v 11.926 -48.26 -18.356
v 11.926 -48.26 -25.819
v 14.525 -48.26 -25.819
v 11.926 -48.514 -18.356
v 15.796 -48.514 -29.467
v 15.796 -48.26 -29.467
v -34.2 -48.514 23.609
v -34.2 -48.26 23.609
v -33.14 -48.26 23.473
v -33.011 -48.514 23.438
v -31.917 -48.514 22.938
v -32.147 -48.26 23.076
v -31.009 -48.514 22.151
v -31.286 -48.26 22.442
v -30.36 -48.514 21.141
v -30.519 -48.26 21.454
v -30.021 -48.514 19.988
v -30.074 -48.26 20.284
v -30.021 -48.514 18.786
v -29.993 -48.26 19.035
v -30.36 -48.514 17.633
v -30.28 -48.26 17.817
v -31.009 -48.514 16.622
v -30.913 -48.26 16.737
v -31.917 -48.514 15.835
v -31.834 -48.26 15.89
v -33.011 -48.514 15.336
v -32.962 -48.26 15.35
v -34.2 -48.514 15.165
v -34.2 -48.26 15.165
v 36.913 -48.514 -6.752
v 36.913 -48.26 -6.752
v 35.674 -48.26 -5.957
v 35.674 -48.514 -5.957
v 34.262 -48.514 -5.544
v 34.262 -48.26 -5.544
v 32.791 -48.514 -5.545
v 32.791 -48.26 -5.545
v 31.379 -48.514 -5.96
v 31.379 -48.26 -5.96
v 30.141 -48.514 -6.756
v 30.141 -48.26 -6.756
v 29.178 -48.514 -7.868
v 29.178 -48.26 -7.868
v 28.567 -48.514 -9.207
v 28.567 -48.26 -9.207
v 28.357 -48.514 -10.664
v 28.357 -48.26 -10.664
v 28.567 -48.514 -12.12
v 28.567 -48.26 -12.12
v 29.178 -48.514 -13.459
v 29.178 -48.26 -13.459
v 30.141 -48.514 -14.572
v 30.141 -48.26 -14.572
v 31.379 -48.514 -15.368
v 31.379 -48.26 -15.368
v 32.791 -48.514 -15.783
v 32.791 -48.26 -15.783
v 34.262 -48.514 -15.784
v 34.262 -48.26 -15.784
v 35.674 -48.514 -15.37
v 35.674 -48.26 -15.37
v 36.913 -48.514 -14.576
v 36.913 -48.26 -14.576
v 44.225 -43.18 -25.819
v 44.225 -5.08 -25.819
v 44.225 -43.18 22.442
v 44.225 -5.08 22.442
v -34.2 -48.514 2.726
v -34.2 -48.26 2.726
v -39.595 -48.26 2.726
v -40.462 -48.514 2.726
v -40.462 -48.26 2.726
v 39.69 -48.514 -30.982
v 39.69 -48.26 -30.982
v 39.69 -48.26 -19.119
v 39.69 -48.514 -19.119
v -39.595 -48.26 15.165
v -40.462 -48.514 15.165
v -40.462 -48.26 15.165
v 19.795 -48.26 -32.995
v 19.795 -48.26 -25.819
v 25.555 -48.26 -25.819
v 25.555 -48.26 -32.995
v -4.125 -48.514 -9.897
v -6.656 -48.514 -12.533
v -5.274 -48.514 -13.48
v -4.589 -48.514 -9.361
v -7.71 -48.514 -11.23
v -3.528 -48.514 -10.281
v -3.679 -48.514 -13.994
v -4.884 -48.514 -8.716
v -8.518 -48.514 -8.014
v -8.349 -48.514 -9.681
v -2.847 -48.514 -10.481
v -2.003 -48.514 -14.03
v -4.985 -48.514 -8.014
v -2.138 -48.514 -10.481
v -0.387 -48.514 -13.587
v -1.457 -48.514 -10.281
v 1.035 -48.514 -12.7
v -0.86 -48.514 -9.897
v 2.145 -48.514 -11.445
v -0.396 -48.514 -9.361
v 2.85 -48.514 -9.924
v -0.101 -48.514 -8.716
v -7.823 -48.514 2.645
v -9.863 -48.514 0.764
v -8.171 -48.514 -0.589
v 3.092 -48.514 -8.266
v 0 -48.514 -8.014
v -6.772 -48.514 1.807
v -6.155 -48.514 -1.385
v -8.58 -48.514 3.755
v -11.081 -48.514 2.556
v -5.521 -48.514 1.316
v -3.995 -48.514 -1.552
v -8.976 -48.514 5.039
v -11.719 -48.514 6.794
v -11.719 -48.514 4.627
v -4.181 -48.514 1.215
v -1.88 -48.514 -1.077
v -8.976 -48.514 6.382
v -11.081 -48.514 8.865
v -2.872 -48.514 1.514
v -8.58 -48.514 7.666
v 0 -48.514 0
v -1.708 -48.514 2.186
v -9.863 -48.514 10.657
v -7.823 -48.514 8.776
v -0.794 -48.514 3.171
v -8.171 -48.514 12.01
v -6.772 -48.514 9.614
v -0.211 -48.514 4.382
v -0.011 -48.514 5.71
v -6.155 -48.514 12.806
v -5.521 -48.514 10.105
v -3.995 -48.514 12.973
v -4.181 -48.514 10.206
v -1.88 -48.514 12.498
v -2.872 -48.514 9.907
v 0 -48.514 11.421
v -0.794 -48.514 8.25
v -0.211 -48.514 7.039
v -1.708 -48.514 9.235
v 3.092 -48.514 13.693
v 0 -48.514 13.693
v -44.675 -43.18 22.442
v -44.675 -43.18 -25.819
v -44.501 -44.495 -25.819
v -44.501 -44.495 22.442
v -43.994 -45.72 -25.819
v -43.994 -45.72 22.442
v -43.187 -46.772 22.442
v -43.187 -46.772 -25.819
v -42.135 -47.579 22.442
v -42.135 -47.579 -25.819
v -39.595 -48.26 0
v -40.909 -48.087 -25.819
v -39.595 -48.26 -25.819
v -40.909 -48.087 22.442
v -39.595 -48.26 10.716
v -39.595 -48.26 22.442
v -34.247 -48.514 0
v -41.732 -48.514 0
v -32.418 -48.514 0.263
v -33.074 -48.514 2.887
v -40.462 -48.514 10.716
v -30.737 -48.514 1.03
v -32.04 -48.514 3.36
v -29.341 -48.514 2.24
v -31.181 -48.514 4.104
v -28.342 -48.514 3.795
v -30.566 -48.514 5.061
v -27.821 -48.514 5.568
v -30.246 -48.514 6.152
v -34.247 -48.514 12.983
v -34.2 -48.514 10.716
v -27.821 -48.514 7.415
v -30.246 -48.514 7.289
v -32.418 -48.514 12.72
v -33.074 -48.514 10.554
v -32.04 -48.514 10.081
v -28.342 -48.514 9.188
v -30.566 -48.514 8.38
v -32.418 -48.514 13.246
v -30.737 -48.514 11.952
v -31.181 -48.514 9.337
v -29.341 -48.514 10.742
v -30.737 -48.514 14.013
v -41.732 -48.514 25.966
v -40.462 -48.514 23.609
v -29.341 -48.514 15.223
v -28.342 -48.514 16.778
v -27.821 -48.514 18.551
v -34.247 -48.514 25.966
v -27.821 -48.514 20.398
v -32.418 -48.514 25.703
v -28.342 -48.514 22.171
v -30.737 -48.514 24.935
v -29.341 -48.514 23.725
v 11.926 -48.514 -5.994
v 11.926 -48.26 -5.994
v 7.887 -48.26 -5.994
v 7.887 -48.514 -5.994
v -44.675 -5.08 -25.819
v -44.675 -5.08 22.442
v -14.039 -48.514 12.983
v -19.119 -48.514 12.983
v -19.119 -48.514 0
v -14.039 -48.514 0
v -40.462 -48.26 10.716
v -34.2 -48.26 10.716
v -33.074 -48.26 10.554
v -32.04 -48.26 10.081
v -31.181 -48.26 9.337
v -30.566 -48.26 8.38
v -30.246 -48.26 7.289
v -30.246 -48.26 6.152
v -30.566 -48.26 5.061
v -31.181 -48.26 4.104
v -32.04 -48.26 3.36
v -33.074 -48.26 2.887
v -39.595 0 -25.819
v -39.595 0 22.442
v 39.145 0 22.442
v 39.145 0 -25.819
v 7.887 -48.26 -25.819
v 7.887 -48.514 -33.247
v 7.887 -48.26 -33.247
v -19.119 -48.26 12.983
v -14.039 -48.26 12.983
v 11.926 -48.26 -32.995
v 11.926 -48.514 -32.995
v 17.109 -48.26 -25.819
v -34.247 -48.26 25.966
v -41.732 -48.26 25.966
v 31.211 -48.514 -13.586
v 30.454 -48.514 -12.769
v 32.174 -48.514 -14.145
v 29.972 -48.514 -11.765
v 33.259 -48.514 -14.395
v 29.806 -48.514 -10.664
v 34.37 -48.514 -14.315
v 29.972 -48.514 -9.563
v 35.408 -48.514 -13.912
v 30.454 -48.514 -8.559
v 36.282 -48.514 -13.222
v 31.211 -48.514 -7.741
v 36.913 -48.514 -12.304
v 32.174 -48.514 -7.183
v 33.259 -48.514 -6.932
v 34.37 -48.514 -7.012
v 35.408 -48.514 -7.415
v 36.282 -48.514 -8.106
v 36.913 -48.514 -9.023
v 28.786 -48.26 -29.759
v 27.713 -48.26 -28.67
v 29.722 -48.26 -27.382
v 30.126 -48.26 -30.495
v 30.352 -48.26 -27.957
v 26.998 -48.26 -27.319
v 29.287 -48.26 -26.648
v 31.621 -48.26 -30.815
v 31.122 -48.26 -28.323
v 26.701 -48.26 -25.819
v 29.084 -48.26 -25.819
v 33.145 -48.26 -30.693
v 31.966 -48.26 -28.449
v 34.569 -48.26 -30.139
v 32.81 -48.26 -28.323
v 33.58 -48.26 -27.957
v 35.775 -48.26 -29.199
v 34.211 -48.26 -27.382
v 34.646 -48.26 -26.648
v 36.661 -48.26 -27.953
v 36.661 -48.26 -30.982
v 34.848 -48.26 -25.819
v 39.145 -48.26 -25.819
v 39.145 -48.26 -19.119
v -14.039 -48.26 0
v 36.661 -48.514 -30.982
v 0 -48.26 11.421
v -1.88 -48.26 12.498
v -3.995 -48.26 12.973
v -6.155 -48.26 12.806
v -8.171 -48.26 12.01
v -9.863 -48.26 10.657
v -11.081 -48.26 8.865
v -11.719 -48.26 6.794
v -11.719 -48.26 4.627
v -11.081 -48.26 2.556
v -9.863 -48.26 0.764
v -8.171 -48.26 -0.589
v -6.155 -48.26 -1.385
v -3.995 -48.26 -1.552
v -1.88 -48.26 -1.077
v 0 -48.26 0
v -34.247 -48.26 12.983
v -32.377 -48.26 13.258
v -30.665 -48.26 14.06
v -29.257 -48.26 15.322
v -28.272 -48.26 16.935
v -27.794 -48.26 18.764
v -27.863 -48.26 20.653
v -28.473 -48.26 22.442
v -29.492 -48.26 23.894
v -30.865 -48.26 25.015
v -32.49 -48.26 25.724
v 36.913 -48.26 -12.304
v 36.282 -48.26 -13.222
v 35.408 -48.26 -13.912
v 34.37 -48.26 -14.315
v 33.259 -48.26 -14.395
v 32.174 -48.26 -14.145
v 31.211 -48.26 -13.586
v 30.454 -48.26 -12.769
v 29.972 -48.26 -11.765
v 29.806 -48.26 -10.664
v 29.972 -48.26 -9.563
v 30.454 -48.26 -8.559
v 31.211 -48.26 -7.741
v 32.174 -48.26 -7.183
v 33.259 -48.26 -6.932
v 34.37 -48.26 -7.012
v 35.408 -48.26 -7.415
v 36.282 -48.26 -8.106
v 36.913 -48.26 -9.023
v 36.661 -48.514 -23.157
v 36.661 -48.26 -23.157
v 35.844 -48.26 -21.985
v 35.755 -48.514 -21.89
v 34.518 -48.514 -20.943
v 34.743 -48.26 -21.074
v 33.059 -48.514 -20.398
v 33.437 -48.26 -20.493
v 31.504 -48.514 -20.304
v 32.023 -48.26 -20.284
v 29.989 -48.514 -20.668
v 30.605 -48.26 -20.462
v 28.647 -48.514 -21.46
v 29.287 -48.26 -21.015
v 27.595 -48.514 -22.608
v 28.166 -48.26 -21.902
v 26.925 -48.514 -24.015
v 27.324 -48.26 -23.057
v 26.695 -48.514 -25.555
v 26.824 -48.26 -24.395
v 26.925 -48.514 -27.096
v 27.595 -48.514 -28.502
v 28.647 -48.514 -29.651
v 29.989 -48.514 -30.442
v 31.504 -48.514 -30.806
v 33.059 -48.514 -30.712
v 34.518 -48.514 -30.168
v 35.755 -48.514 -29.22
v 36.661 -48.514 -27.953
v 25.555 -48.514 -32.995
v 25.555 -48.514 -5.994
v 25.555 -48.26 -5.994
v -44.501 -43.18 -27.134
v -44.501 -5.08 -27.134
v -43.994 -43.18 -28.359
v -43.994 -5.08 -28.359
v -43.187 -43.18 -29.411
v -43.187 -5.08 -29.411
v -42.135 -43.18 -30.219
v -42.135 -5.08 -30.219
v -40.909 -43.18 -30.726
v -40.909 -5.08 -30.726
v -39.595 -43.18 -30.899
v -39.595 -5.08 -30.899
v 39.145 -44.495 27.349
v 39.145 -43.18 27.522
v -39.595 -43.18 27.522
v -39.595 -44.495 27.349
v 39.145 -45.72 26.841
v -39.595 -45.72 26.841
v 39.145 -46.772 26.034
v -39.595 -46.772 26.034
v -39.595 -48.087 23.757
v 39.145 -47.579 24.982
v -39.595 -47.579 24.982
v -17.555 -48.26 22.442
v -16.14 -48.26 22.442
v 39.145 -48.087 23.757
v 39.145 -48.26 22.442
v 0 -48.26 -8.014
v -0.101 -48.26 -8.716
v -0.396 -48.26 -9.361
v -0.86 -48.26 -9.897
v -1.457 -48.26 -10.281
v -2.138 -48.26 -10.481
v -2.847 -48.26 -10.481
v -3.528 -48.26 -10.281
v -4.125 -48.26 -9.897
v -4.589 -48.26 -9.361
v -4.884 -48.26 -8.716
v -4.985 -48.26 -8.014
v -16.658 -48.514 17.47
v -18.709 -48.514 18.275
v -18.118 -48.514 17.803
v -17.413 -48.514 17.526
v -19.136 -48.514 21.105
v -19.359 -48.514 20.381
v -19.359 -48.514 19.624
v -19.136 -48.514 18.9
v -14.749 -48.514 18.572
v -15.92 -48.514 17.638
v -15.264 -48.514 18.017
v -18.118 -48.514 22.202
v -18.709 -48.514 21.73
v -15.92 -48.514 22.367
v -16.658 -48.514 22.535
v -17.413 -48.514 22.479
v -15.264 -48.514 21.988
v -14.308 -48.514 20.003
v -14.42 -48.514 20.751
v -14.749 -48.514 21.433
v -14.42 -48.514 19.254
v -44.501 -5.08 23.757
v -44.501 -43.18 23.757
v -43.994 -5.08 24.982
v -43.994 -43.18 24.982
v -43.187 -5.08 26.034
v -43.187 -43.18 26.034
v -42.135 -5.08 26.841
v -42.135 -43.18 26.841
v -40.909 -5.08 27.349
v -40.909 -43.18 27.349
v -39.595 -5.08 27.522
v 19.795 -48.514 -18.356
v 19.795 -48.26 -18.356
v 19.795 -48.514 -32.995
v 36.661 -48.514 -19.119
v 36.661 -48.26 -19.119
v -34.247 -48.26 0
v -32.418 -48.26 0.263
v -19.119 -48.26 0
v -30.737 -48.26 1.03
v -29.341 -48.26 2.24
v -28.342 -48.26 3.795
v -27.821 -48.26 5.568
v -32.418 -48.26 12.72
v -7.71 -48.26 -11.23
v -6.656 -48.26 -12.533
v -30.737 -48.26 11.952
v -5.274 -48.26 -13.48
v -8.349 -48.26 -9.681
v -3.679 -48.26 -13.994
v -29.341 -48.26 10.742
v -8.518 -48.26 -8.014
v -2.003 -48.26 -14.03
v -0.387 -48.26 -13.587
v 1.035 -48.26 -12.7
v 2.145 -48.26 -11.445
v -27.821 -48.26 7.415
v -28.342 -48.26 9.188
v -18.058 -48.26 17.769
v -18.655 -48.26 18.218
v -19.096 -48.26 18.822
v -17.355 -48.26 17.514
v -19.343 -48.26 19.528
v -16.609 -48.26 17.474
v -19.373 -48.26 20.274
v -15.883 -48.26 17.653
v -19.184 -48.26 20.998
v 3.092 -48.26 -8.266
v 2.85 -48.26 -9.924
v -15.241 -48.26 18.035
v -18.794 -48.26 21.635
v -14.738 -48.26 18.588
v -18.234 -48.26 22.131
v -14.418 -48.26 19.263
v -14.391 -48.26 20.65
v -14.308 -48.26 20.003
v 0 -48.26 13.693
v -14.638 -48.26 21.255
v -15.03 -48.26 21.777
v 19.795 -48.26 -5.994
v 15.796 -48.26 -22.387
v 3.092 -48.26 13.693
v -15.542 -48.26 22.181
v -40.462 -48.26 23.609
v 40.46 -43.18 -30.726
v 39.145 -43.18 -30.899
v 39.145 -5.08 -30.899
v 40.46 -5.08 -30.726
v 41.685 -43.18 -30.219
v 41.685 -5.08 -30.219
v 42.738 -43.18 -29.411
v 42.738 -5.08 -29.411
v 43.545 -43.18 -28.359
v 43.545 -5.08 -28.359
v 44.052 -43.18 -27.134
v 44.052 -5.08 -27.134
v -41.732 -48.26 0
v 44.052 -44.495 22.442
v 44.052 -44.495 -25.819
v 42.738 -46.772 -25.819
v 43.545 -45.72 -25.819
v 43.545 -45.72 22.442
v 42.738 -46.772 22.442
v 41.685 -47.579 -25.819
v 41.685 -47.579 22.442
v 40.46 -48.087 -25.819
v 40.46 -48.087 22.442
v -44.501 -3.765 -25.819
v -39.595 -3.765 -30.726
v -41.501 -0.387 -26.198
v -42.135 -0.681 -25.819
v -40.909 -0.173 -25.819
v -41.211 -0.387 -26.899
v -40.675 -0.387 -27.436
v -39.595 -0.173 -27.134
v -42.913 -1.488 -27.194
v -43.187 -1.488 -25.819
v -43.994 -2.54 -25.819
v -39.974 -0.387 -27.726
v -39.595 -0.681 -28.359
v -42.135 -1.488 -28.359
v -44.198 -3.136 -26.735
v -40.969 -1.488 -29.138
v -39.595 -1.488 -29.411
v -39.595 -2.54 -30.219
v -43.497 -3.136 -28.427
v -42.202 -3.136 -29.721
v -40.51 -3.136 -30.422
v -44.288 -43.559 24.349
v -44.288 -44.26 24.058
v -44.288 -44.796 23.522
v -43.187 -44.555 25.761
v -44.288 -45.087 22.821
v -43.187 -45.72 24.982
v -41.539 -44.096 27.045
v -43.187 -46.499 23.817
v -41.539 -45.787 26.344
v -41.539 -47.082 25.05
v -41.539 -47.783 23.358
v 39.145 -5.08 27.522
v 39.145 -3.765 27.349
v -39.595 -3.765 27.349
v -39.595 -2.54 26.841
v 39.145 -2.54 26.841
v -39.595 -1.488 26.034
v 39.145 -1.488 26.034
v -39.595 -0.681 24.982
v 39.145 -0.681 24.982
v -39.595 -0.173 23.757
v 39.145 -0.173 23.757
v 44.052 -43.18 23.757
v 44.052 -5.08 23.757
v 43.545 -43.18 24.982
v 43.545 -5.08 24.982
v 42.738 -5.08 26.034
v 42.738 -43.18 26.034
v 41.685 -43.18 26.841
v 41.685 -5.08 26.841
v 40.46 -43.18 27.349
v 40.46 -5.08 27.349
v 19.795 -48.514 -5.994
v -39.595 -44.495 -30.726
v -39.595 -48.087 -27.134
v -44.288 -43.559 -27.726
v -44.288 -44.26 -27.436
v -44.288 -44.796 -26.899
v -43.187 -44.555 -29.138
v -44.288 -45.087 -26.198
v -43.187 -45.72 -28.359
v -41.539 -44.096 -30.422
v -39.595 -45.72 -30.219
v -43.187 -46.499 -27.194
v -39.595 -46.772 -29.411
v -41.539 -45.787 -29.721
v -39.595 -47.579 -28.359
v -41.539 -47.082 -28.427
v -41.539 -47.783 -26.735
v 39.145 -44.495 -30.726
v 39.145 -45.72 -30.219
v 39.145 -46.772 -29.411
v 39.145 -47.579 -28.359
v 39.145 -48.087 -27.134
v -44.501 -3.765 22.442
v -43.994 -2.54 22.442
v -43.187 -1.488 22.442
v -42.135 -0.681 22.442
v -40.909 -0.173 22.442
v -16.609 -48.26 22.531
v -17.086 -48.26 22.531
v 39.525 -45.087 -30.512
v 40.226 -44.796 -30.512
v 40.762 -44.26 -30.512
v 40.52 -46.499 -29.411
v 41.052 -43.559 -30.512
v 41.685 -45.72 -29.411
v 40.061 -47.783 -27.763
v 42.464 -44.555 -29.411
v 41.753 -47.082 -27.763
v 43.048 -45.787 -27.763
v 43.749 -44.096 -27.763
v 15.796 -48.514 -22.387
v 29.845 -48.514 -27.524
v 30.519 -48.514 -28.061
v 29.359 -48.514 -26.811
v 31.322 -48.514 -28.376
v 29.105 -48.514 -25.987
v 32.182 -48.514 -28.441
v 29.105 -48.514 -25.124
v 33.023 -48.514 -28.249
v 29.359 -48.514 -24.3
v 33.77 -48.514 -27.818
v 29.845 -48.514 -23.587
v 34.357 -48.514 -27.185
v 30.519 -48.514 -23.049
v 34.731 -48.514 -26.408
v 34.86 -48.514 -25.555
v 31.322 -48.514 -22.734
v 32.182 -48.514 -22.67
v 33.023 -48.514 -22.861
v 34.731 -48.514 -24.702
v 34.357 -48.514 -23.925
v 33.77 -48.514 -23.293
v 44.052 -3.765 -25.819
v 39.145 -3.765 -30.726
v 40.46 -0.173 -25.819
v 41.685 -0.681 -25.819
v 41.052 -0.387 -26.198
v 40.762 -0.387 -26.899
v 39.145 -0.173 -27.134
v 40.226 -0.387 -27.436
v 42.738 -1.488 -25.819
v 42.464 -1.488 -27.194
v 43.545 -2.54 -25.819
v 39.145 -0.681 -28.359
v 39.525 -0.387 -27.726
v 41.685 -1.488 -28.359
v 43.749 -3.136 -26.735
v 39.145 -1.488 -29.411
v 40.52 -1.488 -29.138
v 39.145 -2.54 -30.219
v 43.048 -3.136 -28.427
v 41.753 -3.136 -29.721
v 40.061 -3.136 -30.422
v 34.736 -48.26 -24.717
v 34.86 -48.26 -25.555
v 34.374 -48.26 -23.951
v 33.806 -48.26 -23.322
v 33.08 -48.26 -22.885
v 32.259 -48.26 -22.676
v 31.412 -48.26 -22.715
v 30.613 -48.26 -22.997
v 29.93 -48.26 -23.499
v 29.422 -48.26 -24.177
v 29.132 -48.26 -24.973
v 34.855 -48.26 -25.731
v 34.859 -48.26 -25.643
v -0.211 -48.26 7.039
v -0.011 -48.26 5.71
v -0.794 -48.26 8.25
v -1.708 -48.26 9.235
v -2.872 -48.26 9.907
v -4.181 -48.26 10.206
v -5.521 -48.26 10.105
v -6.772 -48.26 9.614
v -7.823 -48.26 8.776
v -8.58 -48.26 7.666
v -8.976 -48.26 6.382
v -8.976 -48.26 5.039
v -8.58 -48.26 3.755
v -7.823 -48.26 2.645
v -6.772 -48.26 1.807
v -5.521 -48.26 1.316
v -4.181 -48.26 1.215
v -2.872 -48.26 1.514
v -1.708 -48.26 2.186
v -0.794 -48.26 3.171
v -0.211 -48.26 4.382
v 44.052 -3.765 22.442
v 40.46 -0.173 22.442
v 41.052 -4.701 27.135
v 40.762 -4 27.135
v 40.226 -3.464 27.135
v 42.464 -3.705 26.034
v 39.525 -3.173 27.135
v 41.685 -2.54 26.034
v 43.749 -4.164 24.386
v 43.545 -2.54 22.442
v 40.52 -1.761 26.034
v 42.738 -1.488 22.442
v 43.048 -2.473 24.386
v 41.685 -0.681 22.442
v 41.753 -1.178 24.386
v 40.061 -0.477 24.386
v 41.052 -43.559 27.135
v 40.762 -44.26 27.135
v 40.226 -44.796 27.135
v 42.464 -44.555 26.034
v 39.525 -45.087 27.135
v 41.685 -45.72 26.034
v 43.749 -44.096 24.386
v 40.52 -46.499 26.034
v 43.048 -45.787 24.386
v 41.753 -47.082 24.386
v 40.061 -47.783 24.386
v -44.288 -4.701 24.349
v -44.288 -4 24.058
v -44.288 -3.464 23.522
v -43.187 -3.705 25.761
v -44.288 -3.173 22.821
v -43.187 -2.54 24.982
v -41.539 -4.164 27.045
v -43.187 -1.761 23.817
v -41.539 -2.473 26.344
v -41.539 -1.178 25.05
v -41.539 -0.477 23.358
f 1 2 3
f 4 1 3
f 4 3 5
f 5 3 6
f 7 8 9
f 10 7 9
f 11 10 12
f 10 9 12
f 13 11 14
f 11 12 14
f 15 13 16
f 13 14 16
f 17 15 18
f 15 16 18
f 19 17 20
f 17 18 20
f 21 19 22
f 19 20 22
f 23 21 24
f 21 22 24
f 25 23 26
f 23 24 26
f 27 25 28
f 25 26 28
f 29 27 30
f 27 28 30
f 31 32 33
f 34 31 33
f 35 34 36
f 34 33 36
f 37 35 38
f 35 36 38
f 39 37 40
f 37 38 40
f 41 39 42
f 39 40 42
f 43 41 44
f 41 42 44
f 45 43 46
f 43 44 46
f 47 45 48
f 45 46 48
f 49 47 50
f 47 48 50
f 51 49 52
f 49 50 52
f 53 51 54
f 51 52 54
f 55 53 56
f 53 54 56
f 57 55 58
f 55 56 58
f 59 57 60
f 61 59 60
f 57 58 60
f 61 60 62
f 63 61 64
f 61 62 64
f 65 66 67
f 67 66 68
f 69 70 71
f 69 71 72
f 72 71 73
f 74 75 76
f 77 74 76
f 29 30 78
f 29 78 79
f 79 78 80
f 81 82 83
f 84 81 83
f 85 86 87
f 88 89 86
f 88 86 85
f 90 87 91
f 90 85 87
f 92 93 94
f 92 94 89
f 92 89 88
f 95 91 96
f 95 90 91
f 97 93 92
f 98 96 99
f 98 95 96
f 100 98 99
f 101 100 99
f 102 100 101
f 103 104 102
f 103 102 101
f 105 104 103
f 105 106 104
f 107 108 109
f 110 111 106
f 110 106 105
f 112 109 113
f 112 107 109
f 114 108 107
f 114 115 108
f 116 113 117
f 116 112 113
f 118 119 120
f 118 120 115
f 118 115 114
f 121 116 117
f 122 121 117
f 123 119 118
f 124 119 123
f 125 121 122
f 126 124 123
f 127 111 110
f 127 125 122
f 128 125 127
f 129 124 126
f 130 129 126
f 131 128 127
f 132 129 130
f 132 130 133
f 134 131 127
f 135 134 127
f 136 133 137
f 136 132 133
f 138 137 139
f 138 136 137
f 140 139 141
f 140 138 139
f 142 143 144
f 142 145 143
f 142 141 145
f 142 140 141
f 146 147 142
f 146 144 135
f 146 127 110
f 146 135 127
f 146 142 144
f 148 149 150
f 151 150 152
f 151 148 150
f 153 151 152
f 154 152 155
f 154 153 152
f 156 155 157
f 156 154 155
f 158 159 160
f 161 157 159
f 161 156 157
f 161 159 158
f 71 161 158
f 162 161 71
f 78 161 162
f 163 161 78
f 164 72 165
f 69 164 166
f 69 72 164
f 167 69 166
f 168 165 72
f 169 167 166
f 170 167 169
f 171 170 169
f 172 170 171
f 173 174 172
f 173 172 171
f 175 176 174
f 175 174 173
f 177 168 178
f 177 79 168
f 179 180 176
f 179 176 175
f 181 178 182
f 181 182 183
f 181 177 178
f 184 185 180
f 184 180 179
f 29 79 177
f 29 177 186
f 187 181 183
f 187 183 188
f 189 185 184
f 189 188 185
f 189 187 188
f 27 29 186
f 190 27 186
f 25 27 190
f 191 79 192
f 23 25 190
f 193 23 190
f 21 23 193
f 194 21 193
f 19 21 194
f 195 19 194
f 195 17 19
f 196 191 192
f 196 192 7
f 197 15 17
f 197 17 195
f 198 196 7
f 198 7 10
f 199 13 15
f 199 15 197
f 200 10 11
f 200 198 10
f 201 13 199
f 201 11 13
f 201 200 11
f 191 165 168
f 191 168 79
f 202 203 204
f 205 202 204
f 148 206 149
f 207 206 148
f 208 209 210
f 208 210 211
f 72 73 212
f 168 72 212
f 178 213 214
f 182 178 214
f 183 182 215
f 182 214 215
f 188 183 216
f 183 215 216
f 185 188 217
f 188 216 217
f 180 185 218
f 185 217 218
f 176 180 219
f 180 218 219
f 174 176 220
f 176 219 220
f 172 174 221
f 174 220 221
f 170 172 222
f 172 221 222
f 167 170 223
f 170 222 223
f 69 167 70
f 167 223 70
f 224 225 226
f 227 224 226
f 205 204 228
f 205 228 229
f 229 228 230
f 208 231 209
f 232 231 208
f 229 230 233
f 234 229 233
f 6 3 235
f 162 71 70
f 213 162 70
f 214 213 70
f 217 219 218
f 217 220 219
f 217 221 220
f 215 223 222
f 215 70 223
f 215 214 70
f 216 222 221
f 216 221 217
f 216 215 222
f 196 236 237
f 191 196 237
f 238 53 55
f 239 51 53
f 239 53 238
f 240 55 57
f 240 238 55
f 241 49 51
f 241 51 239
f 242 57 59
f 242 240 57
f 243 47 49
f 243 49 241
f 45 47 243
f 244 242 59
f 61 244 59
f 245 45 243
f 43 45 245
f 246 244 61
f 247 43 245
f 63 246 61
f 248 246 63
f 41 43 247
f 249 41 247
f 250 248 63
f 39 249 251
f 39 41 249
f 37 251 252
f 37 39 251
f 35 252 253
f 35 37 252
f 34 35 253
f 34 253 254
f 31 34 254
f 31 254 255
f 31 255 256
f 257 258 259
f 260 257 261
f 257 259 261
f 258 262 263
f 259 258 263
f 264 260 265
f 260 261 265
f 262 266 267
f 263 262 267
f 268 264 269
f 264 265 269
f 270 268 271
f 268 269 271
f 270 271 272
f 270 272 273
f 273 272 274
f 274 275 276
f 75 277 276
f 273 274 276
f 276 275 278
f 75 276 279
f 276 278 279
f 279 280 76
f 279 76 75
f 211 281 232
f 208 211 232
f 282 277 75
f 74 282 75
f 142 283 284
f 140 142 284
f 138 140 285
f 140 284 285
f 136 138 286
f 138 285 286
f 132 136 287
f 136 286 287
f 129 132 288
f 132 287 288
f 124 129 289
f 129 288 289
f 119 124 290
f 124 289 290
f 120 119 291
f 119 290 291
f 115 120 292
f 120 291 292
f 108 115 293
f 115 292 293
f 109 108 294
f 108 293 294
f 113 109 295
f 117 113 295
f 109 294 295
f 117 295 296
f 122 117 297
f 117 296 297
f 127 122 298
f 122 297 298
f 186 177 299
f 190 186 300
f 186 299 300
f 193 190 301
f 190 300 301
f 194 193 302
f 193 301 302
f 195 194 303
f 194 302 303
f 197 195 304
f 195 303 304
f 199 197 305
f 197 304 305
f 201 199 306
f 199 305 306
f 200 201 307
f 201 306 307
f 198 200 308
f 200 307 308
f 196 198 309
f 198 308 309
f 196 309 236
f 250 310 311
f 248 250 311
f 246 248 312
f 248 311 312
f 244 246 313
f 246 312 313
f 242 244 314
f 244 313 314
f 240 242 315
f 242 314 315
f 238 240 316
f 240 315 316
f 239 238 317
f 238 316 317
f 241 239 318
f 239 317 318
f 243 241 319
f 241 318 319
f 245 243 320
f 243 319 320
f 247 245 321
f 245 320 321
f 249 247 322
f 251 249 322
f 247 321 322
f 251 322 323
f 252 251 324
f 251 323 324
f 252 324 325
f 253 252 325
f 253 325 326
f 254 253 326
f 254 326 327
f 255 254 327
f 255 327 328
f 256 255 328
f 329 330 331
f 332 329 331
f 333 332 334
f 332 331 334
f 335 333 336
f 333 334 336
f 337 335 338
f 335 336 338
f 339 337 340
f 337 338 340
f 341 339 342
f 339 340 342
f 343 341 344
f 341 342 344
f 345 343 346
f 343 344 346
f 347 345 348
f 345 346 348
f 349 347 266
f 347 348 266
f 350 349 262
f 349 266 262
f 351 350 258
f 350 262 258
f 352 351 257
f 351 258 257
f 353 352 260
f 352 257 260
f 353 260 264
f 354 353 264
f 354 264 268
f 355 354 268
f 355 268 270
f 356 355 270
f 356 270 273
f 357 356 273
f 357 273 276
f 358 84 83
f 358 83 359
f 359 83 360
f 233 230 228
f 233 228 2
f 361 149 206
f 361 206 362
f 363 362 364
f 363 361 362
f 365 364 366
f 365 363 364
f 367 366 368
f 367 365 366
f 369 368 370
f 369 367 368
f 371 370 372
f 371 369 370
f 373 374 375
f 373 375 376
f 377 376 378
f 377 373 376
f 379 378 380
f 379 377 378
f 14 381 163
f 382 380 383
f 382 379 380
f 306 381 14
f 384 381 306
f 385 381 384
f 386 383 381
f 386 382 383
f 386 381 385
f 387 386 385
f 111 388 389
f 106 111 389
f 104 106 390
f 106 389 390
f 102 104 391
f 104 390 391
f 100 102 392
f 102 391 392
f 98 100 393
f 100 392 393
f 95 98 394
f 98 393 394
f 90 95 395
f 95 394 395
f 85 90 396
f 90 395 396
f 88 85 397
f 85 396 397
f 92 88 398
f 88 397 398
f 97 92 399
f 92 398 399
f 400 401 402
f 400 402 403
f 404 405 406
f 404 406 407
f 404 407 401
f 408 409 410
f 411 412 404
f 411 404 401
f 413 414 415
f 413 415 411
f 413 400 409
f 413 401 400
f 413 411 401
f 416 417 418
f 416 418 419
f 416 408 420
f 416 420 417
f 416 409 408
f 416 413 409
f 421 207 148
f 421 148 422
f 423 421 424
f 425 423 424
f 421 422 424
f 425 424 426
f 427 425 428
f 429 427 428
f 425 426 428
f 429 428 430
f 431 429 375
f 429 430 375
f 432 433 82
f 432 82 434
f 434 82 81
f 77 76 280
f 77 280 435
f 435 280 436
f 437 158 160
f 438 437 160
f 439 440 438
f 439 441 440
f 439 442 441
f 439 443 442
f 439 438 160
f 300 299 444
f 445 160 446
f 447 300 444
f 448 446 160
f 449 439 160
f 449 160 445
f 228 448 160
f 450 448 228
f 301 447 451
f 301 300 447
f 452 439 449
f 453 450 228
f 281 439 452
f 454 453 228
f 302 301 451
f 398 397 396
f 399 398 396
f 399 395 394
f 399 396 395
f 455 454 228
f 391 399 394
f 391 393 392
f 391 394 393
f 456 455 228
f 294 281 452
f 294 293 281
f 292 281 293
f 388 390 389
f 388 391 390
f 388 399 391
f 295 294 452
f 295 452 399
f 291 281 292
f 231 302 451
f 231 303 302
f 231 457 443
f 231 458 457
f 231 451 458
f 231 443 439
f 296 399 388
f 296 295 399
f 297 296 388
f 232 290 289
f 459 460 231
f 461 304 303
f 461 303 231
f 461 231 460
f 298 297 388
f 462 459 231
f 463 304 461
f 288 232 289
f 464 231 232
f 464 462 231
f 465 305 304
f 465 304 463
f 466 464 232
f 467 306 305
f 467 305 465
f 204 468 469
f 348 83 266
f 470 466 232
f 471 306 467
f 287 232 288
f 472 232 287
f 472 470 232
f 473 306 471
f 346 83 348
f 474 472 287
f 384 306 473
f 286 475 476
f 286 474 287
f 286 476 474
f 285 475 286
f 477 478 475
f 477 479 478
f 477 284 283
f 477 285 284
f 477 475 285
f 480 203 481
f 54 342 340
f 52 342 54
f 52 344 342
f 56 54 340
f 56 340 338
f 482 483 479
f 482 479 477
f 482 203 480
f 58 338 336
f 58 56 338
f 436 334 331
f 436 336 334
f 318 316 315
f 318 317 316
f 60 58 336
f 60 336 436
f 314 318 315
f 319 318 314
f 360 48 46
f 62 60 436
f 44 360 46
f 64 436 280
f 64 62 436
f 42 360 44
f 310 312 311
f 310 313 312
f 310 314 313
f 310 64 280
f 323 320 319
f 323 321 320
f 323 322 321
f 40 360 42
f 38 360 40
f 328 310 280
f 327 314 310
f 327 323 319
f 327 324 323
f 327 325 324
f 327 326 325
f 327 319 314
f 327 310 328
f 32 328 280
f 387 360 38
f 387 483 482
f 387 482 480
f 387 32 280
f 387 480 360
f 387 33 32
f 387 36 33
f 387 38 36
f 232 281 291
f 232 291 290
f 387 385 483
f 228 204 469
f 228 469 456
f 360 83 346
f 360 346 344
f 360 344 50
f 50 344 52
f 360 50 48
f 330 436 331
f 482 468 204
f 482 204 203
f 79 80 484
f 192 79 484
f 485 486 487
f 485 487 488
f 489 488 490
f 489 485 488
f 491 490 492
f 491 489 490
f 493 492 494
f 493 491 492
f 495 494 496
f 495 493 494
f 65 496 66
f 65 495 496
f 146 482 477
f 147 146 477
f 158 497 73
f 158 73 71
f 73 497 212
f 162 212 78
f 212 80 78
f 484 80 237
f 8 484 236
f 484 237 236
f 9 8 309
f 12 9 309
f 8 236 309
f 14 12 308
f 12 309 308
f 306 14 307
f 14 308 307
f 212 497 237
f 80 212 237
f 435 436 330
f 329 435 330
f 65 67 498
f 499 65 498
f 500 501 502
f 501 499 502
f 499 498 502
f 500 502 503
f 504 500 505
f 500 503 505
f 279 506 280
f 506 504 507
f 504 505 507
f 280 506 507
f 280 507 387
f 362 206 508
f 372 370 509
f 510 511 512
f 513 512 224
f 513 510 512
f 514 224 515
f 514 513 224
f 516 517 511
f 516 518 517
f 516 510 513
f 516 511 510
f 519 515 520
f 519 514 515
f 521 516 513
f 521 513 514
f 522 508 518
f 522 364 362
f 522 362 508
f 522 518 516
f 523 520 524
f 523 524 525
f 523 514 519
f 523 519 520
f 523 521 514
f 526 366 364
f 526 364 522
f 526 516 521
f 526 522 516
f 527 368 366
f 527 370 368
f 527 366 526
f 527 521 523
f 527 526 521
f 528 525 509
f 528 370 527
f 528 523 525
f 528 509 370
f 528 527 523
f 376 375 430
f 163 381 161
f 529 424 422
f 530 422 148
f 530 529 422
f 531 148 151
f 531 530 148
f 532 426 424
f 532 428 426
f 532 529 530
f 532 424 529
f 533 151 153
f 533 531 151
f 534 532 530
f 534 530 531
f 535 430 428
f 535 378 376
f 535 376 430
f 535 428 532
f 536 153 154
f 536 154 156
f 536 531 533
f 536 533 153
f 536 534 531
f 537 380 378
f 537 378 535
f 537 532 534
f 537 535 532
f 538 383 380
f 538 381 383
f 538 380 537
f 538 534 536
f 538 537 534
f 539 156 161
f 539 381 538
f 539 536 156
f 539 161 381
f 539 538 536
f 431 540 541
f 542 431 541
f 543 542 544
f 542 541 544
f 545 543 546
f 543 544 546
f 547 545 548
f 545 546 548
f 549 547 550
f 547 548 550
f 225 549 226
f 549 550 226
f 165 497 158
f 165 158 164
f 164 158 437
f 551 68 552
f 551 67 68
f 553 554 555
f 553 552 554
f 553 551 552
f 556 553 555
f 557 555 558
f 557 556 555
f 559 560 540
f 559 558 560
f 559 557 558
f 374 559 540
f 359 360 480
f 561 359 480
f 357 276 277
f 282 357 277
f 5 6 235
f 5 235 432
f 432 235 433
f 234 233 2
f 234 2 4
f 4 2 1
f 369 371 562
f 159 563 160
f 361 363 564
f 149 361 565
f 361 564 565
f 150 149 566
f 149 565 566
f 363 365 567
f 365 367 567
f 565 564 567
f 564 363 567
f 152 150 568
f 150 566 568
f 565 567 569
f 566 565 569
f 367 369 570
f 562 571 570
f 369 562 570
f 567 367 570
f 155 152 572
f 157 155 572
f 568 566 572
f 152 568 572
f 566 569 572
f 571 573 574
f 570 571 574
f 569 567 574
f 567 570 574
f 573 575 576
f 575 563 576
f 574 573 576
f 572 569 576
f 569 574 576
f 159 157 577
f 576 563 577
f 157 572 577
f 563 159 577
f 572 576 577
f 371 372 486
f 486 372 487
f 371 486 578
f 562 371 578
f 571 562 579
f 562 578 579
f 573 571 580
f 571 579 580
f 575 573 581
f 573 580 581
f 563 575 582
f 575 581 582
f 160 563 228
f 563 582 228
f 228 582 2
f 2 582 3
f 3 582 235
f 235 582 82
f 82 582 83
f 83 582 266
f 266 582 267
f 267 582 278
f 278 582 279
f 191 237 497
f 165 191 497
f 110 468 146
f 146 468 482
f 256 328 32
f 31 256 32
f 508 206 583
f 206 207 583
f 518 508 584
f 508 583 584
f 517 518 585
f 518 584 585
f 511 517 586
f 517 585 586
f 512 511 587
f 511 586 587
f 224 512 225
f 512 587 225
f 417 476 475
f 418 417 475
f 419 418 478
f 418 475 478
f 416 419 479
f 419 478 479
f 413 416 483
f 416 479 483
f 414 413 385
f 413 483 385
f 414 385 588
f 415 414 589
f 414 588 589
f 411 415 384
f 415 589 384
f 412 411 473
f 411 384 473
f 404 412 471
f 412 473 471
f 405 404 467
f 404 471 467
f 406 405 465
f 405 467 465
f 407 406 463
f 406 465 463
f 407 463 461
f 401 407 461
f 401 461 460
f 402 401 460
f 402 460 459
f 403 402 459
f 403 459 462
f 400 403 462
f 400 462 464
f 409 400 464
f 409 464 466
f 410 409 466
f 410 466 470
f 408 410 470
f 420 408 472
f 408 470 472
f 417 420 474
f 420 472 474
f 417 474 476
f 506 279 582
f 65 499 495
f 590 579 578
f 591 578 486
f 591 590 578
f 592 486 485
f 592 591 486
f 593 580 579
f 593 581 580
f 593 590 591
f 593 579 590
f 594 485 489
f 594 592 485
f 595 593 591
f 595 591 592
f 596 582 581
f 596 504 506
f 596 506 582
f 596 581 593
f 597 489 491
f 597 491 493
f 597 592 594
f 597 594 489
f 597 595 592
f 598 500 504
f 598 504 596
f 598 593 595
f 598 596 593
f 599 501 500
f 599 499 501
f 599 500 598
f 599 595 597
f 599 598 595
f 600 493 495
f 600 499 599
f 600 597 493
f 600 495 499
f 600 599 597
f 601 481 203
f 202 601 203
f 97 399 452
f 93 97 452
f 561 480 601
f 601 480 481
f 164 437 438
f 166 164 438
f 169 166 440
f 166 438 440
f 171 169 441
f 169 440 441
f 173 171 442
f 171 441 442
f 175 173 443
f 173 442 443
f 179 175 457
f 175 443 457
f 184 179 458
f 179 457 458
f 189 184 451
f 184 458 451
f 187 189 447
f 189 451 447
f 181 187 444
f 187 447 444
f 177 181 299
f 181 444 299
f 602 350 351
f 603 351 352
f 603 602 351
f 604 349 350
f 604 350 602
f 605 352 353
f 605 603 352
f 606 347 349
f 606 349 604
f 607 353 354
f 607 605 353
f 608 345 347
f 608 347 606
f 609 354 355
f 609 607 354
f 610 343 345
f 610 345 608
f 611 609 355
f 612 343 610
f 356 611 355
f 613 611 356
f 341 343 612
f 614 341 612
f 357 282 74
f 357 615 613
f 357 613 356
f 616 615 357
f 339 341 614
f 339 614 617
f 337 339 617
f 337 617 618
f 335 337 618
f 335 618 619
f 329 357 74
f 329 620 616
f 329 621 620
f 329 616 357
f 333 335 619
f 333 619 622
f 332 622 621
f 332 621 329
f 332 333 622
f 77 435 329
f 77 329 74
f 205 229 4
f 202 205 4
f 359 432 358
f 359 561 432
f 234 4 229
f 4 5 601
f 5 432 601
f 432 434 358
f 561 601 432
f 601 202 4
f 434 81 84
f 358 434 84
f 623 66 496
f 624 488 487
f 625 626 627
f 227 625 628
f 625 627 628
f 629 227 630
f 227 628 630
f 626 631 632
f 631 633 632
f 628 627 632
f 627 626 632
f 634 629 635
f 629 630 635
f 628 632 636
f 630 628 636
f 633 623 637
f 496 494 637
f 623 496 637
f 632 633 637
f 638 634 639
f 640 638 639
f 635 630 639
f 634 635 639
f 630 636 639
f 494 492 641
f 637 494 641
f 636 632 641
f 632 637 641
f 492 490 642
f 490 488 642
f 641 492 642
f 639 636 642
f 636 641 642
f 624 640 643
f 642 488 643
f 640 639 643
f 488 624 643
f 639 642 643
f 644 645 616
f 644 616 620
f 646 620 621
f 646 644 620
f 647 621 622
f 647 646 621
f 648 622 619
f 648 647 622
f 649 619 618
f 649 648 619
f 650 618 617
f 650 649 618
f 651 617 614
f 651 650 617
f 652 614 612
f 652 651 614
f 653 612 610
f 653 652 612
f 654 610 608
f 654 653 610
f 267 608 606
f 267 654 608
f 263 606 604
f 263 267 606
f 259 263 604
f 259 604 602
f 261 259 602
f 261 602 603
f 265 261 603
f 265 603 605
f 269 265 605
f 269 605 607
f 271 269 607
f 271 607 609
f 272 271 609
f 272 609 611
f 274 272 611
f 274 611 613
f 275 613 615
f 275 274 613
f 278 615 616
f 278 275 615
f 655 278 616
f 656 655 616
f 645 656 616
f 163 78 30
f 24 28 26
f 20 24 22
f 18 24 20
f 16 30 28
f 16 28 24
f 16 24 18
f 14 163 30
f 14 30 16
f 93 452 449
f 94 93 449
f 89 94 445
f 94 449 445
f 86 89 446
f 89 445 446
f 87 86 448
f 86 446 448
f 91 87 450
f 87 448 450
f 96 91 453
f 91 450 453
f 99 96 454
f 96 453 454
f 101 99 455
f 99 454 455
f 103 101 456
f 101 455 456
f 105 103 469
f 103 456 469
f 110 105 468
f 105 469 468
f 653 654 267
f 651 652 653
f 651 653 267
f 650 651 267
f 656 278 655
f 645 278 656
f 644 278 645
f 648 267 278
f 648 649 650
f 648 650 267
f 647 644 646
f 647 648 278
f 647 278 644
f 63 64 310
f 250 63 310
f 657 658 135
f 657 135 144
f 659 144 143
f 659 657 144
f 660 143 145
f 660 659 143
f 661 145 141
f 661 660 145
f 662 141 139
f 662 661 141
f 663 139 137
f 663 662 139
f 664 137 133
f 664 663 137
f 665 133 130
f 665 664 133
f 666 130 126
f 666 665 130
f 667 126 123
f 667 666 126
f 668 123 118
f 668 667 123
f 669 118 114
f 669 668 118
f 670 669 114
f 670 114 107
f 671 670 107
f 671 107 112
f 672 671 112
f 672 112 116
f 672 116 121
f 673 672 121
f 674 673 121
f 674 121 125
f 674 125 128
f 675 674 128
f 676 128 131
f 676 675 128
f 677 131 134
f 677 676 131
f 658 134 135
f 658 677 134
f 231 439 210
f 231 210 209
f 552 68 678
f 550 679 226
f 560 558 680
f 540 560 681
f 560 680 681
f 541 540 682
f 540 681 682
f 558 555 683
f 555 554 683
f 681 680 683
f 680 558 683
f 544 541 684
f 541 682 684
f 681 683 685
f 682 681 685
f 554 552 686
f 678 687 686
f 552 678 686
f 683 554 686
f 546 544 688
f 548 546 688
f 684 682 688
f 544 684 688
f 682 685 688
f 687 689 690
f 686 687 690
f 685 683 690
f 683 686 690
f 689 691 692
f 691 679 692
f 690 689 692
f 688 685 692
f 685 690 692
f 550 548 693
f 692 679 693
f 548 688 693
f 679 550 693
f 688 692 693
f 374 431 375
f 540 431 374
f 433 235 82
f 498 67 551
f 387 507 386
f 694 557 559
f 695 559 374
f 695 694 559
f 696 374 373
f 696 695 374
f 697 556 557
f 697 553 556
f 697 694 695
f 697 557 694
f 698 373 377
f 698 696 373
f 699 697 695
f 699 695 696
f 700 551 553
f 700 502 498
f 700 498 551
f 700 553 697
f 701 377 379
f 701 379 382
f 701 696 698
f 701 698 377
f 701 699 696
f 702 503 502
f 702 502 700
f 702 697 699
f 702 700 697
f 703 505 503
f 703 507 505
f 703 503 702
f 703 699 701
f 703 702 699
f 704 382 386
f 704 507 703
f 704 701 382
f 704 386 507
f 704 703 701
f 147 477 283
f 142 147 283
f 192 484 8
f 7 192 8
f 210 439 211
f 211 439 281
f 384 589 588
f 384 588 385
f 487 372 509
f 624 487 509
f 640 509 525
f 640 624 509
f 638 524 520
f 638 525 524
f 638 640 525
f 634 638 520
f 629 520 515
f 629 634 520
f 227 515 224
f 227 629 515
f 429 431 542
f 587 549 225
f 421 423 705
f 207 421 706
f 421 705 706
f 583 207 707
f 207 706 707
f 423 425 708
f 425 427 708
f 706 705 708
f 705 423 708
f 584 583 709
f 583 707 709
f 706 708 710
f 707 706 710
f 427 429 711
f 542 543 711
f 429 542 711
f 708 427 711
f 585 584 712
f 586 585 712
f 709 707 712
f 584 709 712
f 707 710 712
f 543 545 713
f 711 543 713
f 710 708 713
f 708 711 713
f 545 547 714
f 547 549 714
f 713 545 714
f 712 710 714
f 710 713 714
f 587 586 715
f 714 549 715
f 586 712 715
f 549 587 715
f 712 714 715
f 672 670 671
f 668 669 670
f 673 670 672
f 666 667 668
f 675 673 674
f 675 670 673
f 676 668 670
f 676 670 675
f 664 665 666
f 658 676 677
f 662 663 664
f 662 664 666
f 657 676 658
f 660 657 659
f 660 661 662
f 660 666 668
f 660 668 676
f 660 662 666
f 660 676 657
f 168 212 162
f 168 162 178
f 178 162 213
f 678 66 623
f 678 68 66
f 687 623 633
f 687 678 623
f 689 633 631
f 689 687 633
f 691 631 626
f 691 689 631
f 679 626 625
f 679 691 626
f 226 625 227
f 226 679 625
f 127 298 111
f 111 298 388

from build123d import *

# Parameters (mm, degrees)
F0_W     = 88.9
F0_H     = 58.421202
F1_DEPTH = 48.26
F2_R     = 5.08
F3_W     = 5.08
F3_H     = 12.982895
F3_R     = 2.54
F3_R_2   = 4.507617
F3_R_3   = 2.893788
F4_DEPTH = 0.254


with BuildPart() as f1:
    # F0 (on Front) → F1 (new body)
    with BuildSketch(Plane.XZ):
        with Locations((-0.224516, -1.688525)):
            Rectangle(F0_W, F0_H)
    extrude(amount=F1_DEPTH)

    # F2
    f2_edges = [f1.edges().sort_by_distance(p)[0] for p in [
        (44.225484, -48.26, -1.688525),
        (-0.224516, -48.26, -30.899126),
        (44.225484, -24.13, -30.899126),
        (44.225484, 0, -1.688525),
        (44.225484, -24.13, 27.522076),
        (-0.224516, 0, 27.522076),
        (-0.224516, -48.26, 27.522076),
        (-44.674516, -24.13, 27.522076),
        (-44.674516, -24.13, -30.899126),
        (-44.674516, 0, -1.688525),
        (-0.224516, 0, -30.899126),
        (-44.674516, -48.26, -1.688525),
    ]]
    fillet(f2_edges, radius=F2_R)

    # F3 (on face) → F4 (join)
    with BuildSketch(Plane.XZ.offset(48.26)):
        with BuildLine():
            Line((-34.246631, 25.965789), (-41.732468, 25.965789))
            Line((-41.732468, 25.965789), (-41.732468, 0))
            Line((-41.732468, 0), (-34.246631, 0))
            ThreePointArc((-34.246631, 0), (-27.755184, 6.491447), (-34.246631, 12.982895))
            ThreePointArc((-34.246631, 12.982895), (-27.755184, 19.474342), (-34.246631, 25.965789))
        make_face()
        with BuildLine():
            Line((-40.462468, 2.725626), (-40.462468, 10.715656))
            Line((-40.462468, 10.715656), (-34.199979, 10.715656))
            ThreePointArc((-34.199979, 10.715656), (-30.204964, 6.720641), (-34.199979, 2.725626))
            Line((-34.199979, 2.725626), (-40.462468, 2.725626))
        make_face(mode=Mode.SUBTRACT)
        with BuildLine():
            Line((-40.462468, 15.164651), (-40.462468, 23.60866))
            Line((-40.462468, 23.60866), (-34.199979, 23.60866))
            ThreePointArc((-34.199979, 23.60866), (-29.977974, 19.386656), (-34.199979, 15.164651))
            Line((-34.199979, 15.164651), (-40.462468, 15.164651))
        make_face(mode=Mode.SUBTRACT)
        with Locations((-16.57911, 6.491447)):
            Rectangle(F3_W, F3_H)
        with Locations((-16.847532, 20.002501)):
            Circle(F3_R)
        with BuildLine():
            Line((3.091869, 13.692563), (0, 13.692563))
            Line((0, 13.692563), (0, 11.420986))
            ThreePointArc((0, 11.420986), (-11.800197, 5.710493), (0, 0))
            Line((0, 0), (0, -4.98485))
            Line((0, -4.98485), (0, -8.01362))
            ThreePointArc((0, -8.01362), (-2.492425, -10.506046), (-4.984851, -8.01362))
            Line((-4.984851, -8.01362), (-8.518415, -8.01362))
            ThreePointArc((-8.518415, -8.01362), (-2.842245, -14.072531), (3.091869, -8.266018))
            Line((3.091869, -8.266018), (3.091869, -5.489645))
            Line((3.091869, -5.489645), (3.091869, -2.965671))
            Line((3.091869, -2.965671), (3.091869, 13.692563))
        make_face()
        with Locations((-4.518354, 5.710493)):
            Circle(F3_R_2, mode=Mode.SUBTRACT)
        Polygon((7.887421, -5.994441), (7.887421, -33.247489), (11.925781, -32.99509), (11.925781, -18.356085), (15.796138, -29.466899), (19.794538, -18.356085), (19.794538, -32.99509), (25.555243, -32.99509), (25.555243, -5.994441), (19.794538, -5.994441), (15.796138, -22.386515), (11.925781, -5.994441), align=None)
        with BuildLine():
            Line((36.660735, -19.119108), (36.660735, -23.157468))
            ThreePointArc((36.660735, -23.157468), (26.694659, -25.555245), (36.660735, -27.953021))
            Line((36.660735, -27.953021), (36.660735, -30.981792))
            Line((36.660735, -30.981792), (39.689504, -30.981792))
            Line((39.689504, -30.981792), (39.689504, -19.119108))
            Line((39.689504, -19.119108), (36.660735, -19.119108))
        make_face()
        with Locations((31.966142, -25.555245)):
            Circle(F3_R_3, mode=Mode.SUBTRACT)
        with BuildLine():
            Line((36.91313, -9.02321), (36.91313, -6.751633))
            ThreePointArc((36.91313, -6.751633), (28.357434, -10.663793), (36.91313, -14.575954))
            Line((36.91313, -14.575954), (36.91313, -12.304377))
            ThreePointArc((36.91313, -12.304377), (29.806476, -10.663793), (36.91313, -9.02321))
        make_face()
    extrude(amount=F4_DEPTH)


solid = f1.part
